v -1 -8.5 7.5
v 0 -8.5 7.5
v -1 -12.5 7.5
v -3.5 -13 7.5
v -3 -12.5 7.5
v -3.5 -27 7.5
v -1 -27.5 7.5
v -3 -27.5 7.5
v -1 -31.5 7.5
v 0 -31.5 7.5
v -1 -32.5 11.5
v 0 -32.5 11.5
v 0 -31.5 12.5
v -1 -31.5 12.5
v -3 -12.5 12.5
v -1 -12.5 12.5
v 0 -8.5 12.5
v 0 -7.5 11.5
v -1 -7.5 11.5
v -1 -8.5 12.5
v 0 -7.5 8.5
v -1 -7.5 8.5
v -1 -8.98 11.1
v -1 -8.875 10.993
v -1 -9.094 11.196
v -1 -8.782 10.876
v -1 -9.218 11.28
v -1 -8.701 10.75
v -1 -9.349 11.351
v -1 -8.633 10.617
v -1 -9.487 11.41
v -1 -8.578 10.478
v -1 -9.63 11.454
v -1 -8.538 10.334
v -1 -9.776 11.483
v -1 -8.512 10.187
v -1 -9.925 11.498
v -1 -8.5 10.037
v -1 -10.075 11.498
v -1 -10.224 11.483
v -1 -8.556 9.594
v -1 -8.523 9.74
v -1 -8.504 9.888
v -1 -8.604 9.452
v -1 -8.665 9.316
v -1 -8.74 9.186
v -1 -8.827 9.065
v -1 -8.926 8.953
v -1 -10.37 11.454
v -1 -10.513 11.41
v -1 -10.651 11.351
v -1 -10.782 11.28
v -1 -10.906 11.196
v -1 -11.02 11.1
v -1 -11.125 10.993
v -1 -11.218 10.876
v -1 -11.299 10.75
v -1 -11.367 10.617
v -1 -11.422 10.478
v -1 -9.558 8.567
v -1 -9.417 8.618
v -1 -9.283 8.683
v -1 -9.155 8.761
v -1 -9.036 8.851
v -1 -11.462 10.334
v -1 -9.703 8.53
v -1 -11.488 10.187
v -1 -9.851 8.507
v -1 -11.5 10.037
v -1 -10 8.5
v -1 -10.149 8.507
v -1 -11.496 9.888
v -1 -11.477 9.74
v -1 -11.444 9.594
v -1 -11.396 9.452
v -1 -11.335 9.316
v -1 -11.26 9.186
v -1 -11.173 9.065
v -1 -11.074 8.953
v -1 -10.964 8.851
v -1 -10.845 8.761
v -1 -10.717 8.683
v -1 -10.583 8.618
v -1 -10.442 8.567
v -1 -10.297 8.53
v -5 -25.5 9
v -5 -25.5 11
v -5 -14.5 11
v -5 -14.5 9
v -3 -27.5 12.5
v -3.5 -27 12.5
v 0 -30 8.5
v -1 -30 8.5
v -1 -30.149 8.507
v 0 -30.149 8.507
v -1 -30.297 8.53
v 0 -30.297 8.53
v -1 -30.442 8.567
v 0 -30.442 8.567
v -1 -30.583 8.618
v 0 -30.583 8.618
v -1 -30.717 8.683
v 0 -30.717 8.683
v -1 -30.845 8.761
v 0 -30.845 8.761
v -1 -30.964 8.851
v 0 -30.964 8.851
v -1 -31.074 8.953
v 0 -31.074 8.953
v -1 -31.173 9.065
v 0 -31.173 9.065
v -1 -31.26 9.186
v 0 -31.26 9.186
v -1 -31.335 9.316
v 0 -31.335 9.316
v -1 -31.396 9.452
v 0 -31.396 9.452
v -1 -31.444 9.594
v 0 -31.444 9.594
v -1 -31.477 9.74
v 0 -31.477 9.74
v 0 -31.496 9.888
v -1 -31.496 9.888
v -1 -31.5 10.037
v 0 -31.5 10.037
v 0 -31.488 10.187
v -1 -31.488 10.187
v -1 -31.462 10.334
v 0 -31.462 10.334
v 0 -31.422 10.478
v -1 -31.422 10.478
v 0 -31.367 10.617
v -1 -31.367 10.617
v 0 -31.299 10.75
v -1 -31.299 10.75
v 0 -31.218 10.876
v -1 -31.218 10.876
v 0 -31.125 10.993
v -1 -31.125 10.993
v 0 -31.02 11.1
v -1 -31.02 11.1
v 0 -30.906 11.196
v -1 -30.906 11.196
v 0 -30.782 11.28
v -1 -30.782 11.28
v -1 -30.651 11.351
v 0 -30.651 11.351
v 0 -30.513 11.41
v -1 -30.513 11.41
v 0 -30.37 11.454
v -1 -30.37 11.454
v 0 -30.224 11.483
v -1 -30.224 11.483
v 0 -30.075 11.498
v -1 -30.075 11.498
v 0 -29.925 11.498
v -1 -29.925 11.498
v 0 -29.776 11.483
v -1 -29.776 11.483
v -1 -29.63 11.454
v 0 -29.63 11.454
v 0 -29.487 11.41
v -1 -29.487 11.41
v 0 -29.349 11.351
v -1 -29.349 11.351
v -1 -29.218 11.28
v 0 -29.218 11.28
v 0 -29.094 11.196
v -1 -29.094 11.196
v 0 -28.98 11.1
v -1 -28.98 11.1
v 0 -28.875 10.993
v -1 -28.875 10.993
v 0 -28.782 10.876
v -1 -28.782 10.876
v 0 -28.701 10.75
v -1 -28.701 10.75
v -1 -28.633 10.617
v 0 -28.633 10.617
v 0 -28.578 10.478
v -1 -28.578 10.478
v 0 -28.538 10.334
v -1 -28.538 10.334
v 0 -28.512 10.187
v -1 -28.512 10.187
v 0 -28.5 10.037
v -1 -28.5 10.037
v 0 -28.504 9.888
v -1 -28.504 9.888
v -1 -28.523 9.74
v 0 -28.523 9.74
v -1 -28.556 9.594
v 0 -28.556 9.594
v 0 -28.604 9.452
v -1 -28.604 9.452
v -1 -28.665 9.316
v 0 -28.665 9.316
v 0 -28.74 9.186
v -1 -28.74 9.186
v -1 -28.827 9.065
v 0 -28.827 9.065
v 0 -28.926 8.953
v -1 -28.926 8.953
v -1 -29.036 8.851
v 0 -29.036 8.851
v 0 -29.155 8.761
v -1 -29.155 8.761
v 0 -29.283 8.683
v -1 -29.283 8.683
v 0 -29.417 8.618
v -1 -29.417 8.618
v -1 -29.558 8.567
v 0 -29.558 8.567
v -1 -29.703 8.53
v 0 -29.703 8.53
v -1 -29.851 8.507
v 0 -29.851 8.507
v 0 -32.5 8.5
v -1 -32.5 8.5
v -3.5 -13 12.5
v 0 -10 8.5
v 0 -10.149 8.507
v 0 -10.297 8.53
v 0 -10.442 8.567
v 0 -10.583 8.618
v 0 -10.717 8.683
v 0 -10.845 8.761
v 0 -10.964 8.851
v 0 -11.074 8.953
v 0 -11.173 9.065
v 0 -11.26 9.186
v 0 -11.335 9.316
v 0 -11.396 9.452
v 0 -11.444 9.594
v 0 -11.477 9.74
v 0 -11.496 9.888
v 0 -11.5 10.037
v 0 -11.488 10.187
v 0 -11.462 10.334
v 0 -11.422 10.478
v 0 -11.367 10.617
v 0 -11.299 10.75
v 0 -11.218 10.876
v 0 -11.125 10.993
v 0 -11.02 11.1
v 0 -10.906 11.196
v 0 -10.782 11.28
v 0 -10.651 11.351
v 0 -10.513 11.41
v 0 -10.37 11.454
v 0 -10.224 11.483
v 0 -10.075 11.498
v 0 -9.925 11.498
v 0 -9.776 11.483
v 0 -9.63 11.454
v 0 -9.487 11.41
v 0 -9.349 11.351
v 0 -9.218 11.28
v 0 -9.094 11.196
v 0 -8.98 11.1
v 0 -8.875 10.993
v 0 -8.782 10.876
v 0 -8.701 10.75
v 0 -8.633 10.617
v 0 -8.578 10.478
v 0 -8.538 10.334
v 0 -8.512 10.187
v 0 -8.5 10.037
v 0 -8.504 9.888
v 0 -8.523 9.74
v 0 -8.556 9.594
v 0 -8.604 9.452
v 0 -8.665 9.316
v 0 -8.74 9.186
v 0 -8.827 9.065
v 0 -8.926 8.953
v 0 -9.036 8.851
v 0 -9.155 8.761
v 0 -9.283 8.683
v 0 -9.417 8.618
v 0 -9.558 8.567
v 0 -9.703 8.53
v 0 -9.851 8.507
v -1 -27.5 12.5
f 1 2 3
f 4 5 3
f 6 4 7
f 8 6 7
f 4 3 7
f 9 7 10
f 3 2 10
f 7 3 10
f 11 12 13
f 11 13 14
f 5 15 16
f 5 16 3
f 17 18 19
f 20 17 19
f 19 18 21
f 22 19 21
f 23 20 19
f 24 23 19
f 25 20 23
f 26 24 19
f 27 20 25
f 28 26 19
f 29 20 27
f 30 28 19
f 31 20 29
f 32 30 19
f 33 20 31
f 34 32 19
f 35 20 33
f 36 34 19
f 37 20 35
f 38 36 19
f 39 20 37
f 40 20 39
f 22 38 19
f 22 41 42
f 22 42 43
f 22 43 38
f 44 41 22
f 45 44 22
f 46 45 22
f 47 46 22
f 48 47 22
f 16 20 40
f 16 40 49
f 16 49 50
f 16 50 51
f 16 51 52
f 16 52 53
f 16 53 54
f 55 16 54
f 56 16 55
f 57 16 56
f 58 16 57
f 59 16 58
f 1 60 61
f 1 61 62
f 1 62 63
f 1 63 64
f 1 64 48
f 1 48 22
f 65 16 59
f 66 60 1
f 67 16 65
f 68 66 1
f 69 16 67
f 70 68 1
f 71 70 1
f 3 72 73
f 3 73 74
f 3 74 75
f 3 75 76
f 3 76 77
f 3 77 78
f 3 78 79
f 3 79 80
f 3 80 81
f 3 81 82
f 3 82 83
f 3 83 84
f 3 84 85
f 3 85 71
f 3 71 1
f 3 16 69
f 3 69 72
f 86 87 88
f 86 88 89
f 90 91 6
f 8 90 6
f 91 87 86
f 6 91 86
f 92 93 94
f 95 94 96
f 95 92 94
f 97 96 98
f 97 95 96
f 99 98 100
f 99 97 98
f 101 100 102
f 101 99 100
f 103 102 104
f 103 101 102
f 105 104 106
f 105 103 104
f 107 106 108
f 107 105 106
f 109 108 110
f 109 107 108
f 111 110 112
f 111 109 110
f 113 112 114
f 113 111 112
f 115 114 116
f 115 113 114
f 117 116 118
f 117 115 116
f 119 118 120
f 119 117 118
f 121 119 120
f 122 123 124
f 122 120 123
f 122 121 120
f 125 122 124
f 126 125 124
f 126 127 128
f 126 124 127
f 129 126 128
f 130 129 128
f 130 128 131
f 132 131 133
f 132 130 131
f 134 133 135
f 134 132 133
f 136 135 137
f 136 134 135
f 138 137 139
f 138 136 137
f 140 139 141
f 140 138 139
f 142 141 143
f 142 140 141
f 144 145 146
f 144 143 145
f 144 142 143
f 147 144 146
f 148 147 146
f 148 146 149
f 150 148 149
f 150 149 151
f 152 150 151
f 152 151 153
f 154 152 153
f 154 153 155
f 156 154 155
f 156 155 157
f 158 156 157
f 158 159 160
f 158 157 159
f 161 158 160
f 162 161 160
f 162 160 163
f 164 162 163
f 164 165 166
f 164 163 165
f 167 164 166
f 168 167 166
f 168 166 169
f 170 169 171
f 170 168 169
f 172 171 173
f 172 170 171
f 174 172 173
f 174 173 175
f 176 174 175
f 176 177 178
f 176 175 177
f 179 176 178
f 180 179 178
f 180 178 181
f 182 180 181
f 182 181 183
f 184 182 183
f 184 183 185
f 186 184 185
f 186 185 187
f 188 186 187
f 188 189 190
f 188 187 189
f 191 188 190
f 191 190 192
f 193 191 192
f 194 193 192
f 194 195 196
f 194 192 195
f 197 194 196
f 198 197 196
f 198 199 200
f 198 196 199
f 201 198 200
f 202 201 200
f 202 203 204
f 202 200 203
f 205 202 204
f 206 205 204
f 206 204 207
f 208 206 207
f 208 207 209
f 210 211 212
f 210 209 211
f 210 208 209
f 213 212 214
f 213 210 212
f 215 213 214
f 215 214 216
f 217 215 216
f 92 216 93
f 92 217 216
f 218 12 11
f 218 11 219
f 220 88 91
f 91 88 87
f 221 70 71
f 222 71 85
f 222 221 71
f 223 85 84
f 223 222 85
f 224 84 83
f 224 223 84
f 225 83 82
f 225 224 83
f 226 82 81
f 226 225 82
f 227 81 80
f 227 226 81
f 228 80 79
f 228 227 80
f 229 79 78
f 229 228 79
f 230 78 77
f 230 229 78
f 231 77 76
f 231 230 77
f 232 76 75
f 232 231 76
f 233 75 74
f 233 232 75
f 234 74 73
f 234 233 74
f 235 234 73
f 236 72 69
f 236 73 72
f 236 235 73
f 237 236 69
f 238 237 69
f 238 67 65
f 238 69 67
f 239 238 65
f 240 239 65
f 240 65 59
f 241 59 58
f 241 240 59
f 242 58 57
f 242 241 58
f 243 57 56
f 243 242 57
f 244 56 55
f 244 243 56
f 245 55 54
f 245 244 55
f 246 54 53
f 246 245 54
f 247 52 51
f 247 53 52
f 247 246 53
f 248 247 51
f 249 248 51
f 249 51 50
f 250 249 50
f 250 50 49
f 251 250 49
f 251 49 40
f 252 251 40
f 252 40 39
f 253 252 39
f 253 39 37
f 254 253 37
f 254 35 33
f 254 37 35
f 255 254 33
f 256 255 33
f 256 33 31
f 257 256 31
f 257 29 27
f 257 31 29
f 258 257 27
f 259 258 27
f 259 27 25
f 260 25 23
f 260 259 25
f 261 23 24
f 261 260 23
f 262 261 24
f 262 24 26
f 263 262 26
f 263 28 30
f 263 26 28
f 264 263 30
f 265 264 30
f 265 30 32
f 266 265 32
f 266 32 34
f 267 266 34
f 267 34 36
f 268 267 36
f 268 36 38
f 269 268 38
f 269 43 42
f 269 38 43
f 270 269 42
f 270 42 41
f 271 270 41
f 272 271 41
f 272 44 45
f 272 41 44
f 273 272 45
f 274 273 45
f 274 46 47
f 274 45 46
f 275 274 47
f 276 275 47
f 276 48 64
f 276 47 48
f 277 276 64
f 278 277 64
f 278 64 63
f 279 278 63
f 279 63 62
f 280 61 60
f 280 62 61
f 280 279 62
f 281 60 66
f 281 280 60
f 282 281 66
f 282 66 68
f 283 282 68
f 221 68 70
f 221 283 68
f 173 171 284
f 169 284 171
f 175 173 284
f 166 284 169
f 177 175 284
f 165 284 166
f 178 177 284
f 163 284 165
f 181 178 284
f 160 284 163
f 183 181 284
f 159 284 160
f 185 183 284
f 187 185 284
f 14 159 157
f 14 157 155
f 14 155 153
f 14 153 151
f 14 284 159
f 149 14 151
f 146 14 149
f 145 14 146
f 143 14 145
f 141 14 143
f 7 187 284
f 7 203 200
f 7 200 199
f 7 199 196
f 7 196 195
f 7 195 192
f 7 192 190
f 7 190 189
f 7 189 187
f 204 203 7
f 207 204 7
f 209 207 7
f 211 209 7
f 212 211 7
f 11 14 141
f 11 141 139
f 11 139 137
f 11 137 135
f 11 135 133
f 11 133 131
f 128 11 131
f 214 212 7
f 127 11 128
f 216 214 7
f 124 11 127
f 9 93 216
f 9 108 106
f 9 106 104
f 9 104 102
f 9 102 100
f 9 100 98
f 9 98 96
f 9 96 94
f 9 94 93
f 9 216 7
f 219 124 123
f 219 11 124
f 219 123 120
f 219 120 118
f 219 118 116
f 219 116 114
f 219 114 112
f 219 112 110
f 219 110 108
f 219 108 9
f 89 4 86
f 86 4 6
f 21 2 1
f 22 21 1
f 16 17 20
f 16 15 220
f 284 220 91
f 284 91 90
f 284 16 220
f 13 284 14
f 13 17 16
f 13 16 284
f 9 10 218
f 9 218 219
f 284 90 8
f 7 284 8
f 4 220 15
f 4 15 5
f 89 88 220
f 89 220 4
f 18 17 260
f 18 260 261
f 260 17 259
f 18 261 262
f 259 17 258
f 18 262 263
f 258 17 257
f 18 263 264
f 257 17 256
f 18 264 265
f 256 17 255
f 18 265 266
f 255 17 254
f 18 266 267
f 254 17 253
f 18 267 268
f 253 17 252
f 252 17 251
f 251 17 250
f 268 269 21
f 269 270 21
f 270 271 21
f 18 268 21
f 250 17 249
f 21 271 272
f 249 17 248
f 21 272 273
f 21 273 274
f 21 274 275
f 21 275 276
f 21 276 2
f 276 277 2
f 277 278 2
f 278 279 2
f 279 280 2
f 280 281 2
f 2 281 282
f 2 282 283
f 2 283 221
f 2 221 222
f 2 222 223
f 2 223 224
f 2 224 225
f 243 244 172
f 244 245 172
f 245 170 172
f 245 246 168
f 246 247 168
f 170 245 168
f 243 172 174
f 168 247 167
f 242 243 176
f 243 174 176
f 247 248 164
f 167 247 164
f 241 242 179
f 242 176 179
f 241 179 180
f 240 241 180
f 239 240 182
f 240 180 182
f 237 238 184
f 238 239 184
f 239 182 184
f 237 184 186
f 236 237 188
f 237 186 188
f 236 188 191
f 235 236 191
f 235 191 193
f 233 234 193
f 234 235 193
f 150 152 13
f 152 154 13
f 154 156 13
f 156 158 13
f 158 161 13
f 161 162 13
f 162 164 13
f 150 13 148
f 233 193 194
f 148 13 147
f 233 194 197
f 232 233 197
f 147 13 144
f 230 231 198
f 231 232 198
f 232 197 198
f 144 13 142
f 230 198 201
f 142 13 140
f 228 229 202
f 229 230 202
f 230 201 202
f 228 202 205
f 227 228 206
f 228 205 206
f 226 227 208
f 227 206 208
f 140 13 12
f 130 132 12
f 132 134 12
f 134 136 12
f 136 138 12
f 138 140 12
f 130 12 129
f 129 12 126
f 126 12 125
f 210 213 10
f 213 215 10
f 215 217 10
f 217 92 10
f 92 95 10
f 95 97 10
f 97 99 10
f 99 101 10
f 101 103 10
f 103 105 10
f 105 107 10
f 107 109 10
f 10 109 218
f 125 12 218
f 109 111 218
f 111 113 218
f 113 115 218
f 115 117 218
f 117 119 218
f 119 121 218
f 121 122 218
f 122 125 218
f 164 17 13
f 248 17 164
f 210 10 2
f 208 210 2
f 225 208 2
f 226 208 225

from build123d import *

# Parameters (mm, degrees)
SKETCH003_W     = 5
SKETCH003_H     = 25
SKETCH003_R     = 1.5
PAD001_DEPTH    = 5
SKETCH004_W     = 5
SKETCH004_H     = 5
POCKET002_DEPTH = 4
CHAMFER003_SIZE = 1.5
CHAMFER004_SIZE = 2
CHAMFER005_SIZE = 1


with BuildPart() as part:
    # Sketch003 (on DatumPlane) → Pad001 (new body)
    with BuildSketch(Plane(origin=(0, 0, 0), x_dir=(0, 0, -1), z_dir=(-1, 0, 0))):
        with Locations((-10, 20)):
            Rectangle(SKETCH003_W, SKETCH003_H)
        with Locations((-10, 30)):
            Circle(SKETCH003_R, mode=Mode.SUBTRACT)
        with Locations((-10, 10)):
            Circle(SKETCH003_R, mode=Mode.SUBTRACT)
    extrude(amount=PAD001_DEPTH)

    # Sketch004 (on Face8 of Pad001) → Pocket002 (cut)
    with BuildSketch(Plane(origin=(-5, 0, 0), x_dir=(0, 0, -1), z_dir=(-1, 0, 0))):
        with Locations((-10, 30)):
            Rectangle(SKETCH004_W, SKETCH004_H)
        with Locations((-10, 10)):
            Rectangle(SKETCH004_W, SKETCH004_H)
    extrude(amount=-POCKET002_DEPTH, mode=Mode.SUBTRACT)

    # Chamfer003
    chamfer003_edges = [part.edges().sort_by_distance(p)[0] for p in [
        (-5, -20, 12.5),
        (-5, -20, 7.5),
    ]]
    chamfer(chamfer003_edges, length=CHAMFER003_SIZE)

    # Chamfer004
    chamfer004_edges = [part.edges().sort_by_distance(p)[0] for p in [
        (-5, -12.5, 10),
        (-5, -27.5, 10),
    ]]
    chamfer(chamfer004_edges, length=CHAMFER004_SIZE)

    # Chamfer005
    chamfer005_edges = [part.edges().sort_by_distance(p)[0] for p in [
        (-0.5, -7.5, 7.5),
        (-0.5, -7.5, 12.5),
        (-0.5, -32.5, 7.5),
        (-0.5, -32.5, 12.5),
    ]]
    chamfer(chamfer005_edges, length=CHAMFER005_SIZE)


solid = part.part
